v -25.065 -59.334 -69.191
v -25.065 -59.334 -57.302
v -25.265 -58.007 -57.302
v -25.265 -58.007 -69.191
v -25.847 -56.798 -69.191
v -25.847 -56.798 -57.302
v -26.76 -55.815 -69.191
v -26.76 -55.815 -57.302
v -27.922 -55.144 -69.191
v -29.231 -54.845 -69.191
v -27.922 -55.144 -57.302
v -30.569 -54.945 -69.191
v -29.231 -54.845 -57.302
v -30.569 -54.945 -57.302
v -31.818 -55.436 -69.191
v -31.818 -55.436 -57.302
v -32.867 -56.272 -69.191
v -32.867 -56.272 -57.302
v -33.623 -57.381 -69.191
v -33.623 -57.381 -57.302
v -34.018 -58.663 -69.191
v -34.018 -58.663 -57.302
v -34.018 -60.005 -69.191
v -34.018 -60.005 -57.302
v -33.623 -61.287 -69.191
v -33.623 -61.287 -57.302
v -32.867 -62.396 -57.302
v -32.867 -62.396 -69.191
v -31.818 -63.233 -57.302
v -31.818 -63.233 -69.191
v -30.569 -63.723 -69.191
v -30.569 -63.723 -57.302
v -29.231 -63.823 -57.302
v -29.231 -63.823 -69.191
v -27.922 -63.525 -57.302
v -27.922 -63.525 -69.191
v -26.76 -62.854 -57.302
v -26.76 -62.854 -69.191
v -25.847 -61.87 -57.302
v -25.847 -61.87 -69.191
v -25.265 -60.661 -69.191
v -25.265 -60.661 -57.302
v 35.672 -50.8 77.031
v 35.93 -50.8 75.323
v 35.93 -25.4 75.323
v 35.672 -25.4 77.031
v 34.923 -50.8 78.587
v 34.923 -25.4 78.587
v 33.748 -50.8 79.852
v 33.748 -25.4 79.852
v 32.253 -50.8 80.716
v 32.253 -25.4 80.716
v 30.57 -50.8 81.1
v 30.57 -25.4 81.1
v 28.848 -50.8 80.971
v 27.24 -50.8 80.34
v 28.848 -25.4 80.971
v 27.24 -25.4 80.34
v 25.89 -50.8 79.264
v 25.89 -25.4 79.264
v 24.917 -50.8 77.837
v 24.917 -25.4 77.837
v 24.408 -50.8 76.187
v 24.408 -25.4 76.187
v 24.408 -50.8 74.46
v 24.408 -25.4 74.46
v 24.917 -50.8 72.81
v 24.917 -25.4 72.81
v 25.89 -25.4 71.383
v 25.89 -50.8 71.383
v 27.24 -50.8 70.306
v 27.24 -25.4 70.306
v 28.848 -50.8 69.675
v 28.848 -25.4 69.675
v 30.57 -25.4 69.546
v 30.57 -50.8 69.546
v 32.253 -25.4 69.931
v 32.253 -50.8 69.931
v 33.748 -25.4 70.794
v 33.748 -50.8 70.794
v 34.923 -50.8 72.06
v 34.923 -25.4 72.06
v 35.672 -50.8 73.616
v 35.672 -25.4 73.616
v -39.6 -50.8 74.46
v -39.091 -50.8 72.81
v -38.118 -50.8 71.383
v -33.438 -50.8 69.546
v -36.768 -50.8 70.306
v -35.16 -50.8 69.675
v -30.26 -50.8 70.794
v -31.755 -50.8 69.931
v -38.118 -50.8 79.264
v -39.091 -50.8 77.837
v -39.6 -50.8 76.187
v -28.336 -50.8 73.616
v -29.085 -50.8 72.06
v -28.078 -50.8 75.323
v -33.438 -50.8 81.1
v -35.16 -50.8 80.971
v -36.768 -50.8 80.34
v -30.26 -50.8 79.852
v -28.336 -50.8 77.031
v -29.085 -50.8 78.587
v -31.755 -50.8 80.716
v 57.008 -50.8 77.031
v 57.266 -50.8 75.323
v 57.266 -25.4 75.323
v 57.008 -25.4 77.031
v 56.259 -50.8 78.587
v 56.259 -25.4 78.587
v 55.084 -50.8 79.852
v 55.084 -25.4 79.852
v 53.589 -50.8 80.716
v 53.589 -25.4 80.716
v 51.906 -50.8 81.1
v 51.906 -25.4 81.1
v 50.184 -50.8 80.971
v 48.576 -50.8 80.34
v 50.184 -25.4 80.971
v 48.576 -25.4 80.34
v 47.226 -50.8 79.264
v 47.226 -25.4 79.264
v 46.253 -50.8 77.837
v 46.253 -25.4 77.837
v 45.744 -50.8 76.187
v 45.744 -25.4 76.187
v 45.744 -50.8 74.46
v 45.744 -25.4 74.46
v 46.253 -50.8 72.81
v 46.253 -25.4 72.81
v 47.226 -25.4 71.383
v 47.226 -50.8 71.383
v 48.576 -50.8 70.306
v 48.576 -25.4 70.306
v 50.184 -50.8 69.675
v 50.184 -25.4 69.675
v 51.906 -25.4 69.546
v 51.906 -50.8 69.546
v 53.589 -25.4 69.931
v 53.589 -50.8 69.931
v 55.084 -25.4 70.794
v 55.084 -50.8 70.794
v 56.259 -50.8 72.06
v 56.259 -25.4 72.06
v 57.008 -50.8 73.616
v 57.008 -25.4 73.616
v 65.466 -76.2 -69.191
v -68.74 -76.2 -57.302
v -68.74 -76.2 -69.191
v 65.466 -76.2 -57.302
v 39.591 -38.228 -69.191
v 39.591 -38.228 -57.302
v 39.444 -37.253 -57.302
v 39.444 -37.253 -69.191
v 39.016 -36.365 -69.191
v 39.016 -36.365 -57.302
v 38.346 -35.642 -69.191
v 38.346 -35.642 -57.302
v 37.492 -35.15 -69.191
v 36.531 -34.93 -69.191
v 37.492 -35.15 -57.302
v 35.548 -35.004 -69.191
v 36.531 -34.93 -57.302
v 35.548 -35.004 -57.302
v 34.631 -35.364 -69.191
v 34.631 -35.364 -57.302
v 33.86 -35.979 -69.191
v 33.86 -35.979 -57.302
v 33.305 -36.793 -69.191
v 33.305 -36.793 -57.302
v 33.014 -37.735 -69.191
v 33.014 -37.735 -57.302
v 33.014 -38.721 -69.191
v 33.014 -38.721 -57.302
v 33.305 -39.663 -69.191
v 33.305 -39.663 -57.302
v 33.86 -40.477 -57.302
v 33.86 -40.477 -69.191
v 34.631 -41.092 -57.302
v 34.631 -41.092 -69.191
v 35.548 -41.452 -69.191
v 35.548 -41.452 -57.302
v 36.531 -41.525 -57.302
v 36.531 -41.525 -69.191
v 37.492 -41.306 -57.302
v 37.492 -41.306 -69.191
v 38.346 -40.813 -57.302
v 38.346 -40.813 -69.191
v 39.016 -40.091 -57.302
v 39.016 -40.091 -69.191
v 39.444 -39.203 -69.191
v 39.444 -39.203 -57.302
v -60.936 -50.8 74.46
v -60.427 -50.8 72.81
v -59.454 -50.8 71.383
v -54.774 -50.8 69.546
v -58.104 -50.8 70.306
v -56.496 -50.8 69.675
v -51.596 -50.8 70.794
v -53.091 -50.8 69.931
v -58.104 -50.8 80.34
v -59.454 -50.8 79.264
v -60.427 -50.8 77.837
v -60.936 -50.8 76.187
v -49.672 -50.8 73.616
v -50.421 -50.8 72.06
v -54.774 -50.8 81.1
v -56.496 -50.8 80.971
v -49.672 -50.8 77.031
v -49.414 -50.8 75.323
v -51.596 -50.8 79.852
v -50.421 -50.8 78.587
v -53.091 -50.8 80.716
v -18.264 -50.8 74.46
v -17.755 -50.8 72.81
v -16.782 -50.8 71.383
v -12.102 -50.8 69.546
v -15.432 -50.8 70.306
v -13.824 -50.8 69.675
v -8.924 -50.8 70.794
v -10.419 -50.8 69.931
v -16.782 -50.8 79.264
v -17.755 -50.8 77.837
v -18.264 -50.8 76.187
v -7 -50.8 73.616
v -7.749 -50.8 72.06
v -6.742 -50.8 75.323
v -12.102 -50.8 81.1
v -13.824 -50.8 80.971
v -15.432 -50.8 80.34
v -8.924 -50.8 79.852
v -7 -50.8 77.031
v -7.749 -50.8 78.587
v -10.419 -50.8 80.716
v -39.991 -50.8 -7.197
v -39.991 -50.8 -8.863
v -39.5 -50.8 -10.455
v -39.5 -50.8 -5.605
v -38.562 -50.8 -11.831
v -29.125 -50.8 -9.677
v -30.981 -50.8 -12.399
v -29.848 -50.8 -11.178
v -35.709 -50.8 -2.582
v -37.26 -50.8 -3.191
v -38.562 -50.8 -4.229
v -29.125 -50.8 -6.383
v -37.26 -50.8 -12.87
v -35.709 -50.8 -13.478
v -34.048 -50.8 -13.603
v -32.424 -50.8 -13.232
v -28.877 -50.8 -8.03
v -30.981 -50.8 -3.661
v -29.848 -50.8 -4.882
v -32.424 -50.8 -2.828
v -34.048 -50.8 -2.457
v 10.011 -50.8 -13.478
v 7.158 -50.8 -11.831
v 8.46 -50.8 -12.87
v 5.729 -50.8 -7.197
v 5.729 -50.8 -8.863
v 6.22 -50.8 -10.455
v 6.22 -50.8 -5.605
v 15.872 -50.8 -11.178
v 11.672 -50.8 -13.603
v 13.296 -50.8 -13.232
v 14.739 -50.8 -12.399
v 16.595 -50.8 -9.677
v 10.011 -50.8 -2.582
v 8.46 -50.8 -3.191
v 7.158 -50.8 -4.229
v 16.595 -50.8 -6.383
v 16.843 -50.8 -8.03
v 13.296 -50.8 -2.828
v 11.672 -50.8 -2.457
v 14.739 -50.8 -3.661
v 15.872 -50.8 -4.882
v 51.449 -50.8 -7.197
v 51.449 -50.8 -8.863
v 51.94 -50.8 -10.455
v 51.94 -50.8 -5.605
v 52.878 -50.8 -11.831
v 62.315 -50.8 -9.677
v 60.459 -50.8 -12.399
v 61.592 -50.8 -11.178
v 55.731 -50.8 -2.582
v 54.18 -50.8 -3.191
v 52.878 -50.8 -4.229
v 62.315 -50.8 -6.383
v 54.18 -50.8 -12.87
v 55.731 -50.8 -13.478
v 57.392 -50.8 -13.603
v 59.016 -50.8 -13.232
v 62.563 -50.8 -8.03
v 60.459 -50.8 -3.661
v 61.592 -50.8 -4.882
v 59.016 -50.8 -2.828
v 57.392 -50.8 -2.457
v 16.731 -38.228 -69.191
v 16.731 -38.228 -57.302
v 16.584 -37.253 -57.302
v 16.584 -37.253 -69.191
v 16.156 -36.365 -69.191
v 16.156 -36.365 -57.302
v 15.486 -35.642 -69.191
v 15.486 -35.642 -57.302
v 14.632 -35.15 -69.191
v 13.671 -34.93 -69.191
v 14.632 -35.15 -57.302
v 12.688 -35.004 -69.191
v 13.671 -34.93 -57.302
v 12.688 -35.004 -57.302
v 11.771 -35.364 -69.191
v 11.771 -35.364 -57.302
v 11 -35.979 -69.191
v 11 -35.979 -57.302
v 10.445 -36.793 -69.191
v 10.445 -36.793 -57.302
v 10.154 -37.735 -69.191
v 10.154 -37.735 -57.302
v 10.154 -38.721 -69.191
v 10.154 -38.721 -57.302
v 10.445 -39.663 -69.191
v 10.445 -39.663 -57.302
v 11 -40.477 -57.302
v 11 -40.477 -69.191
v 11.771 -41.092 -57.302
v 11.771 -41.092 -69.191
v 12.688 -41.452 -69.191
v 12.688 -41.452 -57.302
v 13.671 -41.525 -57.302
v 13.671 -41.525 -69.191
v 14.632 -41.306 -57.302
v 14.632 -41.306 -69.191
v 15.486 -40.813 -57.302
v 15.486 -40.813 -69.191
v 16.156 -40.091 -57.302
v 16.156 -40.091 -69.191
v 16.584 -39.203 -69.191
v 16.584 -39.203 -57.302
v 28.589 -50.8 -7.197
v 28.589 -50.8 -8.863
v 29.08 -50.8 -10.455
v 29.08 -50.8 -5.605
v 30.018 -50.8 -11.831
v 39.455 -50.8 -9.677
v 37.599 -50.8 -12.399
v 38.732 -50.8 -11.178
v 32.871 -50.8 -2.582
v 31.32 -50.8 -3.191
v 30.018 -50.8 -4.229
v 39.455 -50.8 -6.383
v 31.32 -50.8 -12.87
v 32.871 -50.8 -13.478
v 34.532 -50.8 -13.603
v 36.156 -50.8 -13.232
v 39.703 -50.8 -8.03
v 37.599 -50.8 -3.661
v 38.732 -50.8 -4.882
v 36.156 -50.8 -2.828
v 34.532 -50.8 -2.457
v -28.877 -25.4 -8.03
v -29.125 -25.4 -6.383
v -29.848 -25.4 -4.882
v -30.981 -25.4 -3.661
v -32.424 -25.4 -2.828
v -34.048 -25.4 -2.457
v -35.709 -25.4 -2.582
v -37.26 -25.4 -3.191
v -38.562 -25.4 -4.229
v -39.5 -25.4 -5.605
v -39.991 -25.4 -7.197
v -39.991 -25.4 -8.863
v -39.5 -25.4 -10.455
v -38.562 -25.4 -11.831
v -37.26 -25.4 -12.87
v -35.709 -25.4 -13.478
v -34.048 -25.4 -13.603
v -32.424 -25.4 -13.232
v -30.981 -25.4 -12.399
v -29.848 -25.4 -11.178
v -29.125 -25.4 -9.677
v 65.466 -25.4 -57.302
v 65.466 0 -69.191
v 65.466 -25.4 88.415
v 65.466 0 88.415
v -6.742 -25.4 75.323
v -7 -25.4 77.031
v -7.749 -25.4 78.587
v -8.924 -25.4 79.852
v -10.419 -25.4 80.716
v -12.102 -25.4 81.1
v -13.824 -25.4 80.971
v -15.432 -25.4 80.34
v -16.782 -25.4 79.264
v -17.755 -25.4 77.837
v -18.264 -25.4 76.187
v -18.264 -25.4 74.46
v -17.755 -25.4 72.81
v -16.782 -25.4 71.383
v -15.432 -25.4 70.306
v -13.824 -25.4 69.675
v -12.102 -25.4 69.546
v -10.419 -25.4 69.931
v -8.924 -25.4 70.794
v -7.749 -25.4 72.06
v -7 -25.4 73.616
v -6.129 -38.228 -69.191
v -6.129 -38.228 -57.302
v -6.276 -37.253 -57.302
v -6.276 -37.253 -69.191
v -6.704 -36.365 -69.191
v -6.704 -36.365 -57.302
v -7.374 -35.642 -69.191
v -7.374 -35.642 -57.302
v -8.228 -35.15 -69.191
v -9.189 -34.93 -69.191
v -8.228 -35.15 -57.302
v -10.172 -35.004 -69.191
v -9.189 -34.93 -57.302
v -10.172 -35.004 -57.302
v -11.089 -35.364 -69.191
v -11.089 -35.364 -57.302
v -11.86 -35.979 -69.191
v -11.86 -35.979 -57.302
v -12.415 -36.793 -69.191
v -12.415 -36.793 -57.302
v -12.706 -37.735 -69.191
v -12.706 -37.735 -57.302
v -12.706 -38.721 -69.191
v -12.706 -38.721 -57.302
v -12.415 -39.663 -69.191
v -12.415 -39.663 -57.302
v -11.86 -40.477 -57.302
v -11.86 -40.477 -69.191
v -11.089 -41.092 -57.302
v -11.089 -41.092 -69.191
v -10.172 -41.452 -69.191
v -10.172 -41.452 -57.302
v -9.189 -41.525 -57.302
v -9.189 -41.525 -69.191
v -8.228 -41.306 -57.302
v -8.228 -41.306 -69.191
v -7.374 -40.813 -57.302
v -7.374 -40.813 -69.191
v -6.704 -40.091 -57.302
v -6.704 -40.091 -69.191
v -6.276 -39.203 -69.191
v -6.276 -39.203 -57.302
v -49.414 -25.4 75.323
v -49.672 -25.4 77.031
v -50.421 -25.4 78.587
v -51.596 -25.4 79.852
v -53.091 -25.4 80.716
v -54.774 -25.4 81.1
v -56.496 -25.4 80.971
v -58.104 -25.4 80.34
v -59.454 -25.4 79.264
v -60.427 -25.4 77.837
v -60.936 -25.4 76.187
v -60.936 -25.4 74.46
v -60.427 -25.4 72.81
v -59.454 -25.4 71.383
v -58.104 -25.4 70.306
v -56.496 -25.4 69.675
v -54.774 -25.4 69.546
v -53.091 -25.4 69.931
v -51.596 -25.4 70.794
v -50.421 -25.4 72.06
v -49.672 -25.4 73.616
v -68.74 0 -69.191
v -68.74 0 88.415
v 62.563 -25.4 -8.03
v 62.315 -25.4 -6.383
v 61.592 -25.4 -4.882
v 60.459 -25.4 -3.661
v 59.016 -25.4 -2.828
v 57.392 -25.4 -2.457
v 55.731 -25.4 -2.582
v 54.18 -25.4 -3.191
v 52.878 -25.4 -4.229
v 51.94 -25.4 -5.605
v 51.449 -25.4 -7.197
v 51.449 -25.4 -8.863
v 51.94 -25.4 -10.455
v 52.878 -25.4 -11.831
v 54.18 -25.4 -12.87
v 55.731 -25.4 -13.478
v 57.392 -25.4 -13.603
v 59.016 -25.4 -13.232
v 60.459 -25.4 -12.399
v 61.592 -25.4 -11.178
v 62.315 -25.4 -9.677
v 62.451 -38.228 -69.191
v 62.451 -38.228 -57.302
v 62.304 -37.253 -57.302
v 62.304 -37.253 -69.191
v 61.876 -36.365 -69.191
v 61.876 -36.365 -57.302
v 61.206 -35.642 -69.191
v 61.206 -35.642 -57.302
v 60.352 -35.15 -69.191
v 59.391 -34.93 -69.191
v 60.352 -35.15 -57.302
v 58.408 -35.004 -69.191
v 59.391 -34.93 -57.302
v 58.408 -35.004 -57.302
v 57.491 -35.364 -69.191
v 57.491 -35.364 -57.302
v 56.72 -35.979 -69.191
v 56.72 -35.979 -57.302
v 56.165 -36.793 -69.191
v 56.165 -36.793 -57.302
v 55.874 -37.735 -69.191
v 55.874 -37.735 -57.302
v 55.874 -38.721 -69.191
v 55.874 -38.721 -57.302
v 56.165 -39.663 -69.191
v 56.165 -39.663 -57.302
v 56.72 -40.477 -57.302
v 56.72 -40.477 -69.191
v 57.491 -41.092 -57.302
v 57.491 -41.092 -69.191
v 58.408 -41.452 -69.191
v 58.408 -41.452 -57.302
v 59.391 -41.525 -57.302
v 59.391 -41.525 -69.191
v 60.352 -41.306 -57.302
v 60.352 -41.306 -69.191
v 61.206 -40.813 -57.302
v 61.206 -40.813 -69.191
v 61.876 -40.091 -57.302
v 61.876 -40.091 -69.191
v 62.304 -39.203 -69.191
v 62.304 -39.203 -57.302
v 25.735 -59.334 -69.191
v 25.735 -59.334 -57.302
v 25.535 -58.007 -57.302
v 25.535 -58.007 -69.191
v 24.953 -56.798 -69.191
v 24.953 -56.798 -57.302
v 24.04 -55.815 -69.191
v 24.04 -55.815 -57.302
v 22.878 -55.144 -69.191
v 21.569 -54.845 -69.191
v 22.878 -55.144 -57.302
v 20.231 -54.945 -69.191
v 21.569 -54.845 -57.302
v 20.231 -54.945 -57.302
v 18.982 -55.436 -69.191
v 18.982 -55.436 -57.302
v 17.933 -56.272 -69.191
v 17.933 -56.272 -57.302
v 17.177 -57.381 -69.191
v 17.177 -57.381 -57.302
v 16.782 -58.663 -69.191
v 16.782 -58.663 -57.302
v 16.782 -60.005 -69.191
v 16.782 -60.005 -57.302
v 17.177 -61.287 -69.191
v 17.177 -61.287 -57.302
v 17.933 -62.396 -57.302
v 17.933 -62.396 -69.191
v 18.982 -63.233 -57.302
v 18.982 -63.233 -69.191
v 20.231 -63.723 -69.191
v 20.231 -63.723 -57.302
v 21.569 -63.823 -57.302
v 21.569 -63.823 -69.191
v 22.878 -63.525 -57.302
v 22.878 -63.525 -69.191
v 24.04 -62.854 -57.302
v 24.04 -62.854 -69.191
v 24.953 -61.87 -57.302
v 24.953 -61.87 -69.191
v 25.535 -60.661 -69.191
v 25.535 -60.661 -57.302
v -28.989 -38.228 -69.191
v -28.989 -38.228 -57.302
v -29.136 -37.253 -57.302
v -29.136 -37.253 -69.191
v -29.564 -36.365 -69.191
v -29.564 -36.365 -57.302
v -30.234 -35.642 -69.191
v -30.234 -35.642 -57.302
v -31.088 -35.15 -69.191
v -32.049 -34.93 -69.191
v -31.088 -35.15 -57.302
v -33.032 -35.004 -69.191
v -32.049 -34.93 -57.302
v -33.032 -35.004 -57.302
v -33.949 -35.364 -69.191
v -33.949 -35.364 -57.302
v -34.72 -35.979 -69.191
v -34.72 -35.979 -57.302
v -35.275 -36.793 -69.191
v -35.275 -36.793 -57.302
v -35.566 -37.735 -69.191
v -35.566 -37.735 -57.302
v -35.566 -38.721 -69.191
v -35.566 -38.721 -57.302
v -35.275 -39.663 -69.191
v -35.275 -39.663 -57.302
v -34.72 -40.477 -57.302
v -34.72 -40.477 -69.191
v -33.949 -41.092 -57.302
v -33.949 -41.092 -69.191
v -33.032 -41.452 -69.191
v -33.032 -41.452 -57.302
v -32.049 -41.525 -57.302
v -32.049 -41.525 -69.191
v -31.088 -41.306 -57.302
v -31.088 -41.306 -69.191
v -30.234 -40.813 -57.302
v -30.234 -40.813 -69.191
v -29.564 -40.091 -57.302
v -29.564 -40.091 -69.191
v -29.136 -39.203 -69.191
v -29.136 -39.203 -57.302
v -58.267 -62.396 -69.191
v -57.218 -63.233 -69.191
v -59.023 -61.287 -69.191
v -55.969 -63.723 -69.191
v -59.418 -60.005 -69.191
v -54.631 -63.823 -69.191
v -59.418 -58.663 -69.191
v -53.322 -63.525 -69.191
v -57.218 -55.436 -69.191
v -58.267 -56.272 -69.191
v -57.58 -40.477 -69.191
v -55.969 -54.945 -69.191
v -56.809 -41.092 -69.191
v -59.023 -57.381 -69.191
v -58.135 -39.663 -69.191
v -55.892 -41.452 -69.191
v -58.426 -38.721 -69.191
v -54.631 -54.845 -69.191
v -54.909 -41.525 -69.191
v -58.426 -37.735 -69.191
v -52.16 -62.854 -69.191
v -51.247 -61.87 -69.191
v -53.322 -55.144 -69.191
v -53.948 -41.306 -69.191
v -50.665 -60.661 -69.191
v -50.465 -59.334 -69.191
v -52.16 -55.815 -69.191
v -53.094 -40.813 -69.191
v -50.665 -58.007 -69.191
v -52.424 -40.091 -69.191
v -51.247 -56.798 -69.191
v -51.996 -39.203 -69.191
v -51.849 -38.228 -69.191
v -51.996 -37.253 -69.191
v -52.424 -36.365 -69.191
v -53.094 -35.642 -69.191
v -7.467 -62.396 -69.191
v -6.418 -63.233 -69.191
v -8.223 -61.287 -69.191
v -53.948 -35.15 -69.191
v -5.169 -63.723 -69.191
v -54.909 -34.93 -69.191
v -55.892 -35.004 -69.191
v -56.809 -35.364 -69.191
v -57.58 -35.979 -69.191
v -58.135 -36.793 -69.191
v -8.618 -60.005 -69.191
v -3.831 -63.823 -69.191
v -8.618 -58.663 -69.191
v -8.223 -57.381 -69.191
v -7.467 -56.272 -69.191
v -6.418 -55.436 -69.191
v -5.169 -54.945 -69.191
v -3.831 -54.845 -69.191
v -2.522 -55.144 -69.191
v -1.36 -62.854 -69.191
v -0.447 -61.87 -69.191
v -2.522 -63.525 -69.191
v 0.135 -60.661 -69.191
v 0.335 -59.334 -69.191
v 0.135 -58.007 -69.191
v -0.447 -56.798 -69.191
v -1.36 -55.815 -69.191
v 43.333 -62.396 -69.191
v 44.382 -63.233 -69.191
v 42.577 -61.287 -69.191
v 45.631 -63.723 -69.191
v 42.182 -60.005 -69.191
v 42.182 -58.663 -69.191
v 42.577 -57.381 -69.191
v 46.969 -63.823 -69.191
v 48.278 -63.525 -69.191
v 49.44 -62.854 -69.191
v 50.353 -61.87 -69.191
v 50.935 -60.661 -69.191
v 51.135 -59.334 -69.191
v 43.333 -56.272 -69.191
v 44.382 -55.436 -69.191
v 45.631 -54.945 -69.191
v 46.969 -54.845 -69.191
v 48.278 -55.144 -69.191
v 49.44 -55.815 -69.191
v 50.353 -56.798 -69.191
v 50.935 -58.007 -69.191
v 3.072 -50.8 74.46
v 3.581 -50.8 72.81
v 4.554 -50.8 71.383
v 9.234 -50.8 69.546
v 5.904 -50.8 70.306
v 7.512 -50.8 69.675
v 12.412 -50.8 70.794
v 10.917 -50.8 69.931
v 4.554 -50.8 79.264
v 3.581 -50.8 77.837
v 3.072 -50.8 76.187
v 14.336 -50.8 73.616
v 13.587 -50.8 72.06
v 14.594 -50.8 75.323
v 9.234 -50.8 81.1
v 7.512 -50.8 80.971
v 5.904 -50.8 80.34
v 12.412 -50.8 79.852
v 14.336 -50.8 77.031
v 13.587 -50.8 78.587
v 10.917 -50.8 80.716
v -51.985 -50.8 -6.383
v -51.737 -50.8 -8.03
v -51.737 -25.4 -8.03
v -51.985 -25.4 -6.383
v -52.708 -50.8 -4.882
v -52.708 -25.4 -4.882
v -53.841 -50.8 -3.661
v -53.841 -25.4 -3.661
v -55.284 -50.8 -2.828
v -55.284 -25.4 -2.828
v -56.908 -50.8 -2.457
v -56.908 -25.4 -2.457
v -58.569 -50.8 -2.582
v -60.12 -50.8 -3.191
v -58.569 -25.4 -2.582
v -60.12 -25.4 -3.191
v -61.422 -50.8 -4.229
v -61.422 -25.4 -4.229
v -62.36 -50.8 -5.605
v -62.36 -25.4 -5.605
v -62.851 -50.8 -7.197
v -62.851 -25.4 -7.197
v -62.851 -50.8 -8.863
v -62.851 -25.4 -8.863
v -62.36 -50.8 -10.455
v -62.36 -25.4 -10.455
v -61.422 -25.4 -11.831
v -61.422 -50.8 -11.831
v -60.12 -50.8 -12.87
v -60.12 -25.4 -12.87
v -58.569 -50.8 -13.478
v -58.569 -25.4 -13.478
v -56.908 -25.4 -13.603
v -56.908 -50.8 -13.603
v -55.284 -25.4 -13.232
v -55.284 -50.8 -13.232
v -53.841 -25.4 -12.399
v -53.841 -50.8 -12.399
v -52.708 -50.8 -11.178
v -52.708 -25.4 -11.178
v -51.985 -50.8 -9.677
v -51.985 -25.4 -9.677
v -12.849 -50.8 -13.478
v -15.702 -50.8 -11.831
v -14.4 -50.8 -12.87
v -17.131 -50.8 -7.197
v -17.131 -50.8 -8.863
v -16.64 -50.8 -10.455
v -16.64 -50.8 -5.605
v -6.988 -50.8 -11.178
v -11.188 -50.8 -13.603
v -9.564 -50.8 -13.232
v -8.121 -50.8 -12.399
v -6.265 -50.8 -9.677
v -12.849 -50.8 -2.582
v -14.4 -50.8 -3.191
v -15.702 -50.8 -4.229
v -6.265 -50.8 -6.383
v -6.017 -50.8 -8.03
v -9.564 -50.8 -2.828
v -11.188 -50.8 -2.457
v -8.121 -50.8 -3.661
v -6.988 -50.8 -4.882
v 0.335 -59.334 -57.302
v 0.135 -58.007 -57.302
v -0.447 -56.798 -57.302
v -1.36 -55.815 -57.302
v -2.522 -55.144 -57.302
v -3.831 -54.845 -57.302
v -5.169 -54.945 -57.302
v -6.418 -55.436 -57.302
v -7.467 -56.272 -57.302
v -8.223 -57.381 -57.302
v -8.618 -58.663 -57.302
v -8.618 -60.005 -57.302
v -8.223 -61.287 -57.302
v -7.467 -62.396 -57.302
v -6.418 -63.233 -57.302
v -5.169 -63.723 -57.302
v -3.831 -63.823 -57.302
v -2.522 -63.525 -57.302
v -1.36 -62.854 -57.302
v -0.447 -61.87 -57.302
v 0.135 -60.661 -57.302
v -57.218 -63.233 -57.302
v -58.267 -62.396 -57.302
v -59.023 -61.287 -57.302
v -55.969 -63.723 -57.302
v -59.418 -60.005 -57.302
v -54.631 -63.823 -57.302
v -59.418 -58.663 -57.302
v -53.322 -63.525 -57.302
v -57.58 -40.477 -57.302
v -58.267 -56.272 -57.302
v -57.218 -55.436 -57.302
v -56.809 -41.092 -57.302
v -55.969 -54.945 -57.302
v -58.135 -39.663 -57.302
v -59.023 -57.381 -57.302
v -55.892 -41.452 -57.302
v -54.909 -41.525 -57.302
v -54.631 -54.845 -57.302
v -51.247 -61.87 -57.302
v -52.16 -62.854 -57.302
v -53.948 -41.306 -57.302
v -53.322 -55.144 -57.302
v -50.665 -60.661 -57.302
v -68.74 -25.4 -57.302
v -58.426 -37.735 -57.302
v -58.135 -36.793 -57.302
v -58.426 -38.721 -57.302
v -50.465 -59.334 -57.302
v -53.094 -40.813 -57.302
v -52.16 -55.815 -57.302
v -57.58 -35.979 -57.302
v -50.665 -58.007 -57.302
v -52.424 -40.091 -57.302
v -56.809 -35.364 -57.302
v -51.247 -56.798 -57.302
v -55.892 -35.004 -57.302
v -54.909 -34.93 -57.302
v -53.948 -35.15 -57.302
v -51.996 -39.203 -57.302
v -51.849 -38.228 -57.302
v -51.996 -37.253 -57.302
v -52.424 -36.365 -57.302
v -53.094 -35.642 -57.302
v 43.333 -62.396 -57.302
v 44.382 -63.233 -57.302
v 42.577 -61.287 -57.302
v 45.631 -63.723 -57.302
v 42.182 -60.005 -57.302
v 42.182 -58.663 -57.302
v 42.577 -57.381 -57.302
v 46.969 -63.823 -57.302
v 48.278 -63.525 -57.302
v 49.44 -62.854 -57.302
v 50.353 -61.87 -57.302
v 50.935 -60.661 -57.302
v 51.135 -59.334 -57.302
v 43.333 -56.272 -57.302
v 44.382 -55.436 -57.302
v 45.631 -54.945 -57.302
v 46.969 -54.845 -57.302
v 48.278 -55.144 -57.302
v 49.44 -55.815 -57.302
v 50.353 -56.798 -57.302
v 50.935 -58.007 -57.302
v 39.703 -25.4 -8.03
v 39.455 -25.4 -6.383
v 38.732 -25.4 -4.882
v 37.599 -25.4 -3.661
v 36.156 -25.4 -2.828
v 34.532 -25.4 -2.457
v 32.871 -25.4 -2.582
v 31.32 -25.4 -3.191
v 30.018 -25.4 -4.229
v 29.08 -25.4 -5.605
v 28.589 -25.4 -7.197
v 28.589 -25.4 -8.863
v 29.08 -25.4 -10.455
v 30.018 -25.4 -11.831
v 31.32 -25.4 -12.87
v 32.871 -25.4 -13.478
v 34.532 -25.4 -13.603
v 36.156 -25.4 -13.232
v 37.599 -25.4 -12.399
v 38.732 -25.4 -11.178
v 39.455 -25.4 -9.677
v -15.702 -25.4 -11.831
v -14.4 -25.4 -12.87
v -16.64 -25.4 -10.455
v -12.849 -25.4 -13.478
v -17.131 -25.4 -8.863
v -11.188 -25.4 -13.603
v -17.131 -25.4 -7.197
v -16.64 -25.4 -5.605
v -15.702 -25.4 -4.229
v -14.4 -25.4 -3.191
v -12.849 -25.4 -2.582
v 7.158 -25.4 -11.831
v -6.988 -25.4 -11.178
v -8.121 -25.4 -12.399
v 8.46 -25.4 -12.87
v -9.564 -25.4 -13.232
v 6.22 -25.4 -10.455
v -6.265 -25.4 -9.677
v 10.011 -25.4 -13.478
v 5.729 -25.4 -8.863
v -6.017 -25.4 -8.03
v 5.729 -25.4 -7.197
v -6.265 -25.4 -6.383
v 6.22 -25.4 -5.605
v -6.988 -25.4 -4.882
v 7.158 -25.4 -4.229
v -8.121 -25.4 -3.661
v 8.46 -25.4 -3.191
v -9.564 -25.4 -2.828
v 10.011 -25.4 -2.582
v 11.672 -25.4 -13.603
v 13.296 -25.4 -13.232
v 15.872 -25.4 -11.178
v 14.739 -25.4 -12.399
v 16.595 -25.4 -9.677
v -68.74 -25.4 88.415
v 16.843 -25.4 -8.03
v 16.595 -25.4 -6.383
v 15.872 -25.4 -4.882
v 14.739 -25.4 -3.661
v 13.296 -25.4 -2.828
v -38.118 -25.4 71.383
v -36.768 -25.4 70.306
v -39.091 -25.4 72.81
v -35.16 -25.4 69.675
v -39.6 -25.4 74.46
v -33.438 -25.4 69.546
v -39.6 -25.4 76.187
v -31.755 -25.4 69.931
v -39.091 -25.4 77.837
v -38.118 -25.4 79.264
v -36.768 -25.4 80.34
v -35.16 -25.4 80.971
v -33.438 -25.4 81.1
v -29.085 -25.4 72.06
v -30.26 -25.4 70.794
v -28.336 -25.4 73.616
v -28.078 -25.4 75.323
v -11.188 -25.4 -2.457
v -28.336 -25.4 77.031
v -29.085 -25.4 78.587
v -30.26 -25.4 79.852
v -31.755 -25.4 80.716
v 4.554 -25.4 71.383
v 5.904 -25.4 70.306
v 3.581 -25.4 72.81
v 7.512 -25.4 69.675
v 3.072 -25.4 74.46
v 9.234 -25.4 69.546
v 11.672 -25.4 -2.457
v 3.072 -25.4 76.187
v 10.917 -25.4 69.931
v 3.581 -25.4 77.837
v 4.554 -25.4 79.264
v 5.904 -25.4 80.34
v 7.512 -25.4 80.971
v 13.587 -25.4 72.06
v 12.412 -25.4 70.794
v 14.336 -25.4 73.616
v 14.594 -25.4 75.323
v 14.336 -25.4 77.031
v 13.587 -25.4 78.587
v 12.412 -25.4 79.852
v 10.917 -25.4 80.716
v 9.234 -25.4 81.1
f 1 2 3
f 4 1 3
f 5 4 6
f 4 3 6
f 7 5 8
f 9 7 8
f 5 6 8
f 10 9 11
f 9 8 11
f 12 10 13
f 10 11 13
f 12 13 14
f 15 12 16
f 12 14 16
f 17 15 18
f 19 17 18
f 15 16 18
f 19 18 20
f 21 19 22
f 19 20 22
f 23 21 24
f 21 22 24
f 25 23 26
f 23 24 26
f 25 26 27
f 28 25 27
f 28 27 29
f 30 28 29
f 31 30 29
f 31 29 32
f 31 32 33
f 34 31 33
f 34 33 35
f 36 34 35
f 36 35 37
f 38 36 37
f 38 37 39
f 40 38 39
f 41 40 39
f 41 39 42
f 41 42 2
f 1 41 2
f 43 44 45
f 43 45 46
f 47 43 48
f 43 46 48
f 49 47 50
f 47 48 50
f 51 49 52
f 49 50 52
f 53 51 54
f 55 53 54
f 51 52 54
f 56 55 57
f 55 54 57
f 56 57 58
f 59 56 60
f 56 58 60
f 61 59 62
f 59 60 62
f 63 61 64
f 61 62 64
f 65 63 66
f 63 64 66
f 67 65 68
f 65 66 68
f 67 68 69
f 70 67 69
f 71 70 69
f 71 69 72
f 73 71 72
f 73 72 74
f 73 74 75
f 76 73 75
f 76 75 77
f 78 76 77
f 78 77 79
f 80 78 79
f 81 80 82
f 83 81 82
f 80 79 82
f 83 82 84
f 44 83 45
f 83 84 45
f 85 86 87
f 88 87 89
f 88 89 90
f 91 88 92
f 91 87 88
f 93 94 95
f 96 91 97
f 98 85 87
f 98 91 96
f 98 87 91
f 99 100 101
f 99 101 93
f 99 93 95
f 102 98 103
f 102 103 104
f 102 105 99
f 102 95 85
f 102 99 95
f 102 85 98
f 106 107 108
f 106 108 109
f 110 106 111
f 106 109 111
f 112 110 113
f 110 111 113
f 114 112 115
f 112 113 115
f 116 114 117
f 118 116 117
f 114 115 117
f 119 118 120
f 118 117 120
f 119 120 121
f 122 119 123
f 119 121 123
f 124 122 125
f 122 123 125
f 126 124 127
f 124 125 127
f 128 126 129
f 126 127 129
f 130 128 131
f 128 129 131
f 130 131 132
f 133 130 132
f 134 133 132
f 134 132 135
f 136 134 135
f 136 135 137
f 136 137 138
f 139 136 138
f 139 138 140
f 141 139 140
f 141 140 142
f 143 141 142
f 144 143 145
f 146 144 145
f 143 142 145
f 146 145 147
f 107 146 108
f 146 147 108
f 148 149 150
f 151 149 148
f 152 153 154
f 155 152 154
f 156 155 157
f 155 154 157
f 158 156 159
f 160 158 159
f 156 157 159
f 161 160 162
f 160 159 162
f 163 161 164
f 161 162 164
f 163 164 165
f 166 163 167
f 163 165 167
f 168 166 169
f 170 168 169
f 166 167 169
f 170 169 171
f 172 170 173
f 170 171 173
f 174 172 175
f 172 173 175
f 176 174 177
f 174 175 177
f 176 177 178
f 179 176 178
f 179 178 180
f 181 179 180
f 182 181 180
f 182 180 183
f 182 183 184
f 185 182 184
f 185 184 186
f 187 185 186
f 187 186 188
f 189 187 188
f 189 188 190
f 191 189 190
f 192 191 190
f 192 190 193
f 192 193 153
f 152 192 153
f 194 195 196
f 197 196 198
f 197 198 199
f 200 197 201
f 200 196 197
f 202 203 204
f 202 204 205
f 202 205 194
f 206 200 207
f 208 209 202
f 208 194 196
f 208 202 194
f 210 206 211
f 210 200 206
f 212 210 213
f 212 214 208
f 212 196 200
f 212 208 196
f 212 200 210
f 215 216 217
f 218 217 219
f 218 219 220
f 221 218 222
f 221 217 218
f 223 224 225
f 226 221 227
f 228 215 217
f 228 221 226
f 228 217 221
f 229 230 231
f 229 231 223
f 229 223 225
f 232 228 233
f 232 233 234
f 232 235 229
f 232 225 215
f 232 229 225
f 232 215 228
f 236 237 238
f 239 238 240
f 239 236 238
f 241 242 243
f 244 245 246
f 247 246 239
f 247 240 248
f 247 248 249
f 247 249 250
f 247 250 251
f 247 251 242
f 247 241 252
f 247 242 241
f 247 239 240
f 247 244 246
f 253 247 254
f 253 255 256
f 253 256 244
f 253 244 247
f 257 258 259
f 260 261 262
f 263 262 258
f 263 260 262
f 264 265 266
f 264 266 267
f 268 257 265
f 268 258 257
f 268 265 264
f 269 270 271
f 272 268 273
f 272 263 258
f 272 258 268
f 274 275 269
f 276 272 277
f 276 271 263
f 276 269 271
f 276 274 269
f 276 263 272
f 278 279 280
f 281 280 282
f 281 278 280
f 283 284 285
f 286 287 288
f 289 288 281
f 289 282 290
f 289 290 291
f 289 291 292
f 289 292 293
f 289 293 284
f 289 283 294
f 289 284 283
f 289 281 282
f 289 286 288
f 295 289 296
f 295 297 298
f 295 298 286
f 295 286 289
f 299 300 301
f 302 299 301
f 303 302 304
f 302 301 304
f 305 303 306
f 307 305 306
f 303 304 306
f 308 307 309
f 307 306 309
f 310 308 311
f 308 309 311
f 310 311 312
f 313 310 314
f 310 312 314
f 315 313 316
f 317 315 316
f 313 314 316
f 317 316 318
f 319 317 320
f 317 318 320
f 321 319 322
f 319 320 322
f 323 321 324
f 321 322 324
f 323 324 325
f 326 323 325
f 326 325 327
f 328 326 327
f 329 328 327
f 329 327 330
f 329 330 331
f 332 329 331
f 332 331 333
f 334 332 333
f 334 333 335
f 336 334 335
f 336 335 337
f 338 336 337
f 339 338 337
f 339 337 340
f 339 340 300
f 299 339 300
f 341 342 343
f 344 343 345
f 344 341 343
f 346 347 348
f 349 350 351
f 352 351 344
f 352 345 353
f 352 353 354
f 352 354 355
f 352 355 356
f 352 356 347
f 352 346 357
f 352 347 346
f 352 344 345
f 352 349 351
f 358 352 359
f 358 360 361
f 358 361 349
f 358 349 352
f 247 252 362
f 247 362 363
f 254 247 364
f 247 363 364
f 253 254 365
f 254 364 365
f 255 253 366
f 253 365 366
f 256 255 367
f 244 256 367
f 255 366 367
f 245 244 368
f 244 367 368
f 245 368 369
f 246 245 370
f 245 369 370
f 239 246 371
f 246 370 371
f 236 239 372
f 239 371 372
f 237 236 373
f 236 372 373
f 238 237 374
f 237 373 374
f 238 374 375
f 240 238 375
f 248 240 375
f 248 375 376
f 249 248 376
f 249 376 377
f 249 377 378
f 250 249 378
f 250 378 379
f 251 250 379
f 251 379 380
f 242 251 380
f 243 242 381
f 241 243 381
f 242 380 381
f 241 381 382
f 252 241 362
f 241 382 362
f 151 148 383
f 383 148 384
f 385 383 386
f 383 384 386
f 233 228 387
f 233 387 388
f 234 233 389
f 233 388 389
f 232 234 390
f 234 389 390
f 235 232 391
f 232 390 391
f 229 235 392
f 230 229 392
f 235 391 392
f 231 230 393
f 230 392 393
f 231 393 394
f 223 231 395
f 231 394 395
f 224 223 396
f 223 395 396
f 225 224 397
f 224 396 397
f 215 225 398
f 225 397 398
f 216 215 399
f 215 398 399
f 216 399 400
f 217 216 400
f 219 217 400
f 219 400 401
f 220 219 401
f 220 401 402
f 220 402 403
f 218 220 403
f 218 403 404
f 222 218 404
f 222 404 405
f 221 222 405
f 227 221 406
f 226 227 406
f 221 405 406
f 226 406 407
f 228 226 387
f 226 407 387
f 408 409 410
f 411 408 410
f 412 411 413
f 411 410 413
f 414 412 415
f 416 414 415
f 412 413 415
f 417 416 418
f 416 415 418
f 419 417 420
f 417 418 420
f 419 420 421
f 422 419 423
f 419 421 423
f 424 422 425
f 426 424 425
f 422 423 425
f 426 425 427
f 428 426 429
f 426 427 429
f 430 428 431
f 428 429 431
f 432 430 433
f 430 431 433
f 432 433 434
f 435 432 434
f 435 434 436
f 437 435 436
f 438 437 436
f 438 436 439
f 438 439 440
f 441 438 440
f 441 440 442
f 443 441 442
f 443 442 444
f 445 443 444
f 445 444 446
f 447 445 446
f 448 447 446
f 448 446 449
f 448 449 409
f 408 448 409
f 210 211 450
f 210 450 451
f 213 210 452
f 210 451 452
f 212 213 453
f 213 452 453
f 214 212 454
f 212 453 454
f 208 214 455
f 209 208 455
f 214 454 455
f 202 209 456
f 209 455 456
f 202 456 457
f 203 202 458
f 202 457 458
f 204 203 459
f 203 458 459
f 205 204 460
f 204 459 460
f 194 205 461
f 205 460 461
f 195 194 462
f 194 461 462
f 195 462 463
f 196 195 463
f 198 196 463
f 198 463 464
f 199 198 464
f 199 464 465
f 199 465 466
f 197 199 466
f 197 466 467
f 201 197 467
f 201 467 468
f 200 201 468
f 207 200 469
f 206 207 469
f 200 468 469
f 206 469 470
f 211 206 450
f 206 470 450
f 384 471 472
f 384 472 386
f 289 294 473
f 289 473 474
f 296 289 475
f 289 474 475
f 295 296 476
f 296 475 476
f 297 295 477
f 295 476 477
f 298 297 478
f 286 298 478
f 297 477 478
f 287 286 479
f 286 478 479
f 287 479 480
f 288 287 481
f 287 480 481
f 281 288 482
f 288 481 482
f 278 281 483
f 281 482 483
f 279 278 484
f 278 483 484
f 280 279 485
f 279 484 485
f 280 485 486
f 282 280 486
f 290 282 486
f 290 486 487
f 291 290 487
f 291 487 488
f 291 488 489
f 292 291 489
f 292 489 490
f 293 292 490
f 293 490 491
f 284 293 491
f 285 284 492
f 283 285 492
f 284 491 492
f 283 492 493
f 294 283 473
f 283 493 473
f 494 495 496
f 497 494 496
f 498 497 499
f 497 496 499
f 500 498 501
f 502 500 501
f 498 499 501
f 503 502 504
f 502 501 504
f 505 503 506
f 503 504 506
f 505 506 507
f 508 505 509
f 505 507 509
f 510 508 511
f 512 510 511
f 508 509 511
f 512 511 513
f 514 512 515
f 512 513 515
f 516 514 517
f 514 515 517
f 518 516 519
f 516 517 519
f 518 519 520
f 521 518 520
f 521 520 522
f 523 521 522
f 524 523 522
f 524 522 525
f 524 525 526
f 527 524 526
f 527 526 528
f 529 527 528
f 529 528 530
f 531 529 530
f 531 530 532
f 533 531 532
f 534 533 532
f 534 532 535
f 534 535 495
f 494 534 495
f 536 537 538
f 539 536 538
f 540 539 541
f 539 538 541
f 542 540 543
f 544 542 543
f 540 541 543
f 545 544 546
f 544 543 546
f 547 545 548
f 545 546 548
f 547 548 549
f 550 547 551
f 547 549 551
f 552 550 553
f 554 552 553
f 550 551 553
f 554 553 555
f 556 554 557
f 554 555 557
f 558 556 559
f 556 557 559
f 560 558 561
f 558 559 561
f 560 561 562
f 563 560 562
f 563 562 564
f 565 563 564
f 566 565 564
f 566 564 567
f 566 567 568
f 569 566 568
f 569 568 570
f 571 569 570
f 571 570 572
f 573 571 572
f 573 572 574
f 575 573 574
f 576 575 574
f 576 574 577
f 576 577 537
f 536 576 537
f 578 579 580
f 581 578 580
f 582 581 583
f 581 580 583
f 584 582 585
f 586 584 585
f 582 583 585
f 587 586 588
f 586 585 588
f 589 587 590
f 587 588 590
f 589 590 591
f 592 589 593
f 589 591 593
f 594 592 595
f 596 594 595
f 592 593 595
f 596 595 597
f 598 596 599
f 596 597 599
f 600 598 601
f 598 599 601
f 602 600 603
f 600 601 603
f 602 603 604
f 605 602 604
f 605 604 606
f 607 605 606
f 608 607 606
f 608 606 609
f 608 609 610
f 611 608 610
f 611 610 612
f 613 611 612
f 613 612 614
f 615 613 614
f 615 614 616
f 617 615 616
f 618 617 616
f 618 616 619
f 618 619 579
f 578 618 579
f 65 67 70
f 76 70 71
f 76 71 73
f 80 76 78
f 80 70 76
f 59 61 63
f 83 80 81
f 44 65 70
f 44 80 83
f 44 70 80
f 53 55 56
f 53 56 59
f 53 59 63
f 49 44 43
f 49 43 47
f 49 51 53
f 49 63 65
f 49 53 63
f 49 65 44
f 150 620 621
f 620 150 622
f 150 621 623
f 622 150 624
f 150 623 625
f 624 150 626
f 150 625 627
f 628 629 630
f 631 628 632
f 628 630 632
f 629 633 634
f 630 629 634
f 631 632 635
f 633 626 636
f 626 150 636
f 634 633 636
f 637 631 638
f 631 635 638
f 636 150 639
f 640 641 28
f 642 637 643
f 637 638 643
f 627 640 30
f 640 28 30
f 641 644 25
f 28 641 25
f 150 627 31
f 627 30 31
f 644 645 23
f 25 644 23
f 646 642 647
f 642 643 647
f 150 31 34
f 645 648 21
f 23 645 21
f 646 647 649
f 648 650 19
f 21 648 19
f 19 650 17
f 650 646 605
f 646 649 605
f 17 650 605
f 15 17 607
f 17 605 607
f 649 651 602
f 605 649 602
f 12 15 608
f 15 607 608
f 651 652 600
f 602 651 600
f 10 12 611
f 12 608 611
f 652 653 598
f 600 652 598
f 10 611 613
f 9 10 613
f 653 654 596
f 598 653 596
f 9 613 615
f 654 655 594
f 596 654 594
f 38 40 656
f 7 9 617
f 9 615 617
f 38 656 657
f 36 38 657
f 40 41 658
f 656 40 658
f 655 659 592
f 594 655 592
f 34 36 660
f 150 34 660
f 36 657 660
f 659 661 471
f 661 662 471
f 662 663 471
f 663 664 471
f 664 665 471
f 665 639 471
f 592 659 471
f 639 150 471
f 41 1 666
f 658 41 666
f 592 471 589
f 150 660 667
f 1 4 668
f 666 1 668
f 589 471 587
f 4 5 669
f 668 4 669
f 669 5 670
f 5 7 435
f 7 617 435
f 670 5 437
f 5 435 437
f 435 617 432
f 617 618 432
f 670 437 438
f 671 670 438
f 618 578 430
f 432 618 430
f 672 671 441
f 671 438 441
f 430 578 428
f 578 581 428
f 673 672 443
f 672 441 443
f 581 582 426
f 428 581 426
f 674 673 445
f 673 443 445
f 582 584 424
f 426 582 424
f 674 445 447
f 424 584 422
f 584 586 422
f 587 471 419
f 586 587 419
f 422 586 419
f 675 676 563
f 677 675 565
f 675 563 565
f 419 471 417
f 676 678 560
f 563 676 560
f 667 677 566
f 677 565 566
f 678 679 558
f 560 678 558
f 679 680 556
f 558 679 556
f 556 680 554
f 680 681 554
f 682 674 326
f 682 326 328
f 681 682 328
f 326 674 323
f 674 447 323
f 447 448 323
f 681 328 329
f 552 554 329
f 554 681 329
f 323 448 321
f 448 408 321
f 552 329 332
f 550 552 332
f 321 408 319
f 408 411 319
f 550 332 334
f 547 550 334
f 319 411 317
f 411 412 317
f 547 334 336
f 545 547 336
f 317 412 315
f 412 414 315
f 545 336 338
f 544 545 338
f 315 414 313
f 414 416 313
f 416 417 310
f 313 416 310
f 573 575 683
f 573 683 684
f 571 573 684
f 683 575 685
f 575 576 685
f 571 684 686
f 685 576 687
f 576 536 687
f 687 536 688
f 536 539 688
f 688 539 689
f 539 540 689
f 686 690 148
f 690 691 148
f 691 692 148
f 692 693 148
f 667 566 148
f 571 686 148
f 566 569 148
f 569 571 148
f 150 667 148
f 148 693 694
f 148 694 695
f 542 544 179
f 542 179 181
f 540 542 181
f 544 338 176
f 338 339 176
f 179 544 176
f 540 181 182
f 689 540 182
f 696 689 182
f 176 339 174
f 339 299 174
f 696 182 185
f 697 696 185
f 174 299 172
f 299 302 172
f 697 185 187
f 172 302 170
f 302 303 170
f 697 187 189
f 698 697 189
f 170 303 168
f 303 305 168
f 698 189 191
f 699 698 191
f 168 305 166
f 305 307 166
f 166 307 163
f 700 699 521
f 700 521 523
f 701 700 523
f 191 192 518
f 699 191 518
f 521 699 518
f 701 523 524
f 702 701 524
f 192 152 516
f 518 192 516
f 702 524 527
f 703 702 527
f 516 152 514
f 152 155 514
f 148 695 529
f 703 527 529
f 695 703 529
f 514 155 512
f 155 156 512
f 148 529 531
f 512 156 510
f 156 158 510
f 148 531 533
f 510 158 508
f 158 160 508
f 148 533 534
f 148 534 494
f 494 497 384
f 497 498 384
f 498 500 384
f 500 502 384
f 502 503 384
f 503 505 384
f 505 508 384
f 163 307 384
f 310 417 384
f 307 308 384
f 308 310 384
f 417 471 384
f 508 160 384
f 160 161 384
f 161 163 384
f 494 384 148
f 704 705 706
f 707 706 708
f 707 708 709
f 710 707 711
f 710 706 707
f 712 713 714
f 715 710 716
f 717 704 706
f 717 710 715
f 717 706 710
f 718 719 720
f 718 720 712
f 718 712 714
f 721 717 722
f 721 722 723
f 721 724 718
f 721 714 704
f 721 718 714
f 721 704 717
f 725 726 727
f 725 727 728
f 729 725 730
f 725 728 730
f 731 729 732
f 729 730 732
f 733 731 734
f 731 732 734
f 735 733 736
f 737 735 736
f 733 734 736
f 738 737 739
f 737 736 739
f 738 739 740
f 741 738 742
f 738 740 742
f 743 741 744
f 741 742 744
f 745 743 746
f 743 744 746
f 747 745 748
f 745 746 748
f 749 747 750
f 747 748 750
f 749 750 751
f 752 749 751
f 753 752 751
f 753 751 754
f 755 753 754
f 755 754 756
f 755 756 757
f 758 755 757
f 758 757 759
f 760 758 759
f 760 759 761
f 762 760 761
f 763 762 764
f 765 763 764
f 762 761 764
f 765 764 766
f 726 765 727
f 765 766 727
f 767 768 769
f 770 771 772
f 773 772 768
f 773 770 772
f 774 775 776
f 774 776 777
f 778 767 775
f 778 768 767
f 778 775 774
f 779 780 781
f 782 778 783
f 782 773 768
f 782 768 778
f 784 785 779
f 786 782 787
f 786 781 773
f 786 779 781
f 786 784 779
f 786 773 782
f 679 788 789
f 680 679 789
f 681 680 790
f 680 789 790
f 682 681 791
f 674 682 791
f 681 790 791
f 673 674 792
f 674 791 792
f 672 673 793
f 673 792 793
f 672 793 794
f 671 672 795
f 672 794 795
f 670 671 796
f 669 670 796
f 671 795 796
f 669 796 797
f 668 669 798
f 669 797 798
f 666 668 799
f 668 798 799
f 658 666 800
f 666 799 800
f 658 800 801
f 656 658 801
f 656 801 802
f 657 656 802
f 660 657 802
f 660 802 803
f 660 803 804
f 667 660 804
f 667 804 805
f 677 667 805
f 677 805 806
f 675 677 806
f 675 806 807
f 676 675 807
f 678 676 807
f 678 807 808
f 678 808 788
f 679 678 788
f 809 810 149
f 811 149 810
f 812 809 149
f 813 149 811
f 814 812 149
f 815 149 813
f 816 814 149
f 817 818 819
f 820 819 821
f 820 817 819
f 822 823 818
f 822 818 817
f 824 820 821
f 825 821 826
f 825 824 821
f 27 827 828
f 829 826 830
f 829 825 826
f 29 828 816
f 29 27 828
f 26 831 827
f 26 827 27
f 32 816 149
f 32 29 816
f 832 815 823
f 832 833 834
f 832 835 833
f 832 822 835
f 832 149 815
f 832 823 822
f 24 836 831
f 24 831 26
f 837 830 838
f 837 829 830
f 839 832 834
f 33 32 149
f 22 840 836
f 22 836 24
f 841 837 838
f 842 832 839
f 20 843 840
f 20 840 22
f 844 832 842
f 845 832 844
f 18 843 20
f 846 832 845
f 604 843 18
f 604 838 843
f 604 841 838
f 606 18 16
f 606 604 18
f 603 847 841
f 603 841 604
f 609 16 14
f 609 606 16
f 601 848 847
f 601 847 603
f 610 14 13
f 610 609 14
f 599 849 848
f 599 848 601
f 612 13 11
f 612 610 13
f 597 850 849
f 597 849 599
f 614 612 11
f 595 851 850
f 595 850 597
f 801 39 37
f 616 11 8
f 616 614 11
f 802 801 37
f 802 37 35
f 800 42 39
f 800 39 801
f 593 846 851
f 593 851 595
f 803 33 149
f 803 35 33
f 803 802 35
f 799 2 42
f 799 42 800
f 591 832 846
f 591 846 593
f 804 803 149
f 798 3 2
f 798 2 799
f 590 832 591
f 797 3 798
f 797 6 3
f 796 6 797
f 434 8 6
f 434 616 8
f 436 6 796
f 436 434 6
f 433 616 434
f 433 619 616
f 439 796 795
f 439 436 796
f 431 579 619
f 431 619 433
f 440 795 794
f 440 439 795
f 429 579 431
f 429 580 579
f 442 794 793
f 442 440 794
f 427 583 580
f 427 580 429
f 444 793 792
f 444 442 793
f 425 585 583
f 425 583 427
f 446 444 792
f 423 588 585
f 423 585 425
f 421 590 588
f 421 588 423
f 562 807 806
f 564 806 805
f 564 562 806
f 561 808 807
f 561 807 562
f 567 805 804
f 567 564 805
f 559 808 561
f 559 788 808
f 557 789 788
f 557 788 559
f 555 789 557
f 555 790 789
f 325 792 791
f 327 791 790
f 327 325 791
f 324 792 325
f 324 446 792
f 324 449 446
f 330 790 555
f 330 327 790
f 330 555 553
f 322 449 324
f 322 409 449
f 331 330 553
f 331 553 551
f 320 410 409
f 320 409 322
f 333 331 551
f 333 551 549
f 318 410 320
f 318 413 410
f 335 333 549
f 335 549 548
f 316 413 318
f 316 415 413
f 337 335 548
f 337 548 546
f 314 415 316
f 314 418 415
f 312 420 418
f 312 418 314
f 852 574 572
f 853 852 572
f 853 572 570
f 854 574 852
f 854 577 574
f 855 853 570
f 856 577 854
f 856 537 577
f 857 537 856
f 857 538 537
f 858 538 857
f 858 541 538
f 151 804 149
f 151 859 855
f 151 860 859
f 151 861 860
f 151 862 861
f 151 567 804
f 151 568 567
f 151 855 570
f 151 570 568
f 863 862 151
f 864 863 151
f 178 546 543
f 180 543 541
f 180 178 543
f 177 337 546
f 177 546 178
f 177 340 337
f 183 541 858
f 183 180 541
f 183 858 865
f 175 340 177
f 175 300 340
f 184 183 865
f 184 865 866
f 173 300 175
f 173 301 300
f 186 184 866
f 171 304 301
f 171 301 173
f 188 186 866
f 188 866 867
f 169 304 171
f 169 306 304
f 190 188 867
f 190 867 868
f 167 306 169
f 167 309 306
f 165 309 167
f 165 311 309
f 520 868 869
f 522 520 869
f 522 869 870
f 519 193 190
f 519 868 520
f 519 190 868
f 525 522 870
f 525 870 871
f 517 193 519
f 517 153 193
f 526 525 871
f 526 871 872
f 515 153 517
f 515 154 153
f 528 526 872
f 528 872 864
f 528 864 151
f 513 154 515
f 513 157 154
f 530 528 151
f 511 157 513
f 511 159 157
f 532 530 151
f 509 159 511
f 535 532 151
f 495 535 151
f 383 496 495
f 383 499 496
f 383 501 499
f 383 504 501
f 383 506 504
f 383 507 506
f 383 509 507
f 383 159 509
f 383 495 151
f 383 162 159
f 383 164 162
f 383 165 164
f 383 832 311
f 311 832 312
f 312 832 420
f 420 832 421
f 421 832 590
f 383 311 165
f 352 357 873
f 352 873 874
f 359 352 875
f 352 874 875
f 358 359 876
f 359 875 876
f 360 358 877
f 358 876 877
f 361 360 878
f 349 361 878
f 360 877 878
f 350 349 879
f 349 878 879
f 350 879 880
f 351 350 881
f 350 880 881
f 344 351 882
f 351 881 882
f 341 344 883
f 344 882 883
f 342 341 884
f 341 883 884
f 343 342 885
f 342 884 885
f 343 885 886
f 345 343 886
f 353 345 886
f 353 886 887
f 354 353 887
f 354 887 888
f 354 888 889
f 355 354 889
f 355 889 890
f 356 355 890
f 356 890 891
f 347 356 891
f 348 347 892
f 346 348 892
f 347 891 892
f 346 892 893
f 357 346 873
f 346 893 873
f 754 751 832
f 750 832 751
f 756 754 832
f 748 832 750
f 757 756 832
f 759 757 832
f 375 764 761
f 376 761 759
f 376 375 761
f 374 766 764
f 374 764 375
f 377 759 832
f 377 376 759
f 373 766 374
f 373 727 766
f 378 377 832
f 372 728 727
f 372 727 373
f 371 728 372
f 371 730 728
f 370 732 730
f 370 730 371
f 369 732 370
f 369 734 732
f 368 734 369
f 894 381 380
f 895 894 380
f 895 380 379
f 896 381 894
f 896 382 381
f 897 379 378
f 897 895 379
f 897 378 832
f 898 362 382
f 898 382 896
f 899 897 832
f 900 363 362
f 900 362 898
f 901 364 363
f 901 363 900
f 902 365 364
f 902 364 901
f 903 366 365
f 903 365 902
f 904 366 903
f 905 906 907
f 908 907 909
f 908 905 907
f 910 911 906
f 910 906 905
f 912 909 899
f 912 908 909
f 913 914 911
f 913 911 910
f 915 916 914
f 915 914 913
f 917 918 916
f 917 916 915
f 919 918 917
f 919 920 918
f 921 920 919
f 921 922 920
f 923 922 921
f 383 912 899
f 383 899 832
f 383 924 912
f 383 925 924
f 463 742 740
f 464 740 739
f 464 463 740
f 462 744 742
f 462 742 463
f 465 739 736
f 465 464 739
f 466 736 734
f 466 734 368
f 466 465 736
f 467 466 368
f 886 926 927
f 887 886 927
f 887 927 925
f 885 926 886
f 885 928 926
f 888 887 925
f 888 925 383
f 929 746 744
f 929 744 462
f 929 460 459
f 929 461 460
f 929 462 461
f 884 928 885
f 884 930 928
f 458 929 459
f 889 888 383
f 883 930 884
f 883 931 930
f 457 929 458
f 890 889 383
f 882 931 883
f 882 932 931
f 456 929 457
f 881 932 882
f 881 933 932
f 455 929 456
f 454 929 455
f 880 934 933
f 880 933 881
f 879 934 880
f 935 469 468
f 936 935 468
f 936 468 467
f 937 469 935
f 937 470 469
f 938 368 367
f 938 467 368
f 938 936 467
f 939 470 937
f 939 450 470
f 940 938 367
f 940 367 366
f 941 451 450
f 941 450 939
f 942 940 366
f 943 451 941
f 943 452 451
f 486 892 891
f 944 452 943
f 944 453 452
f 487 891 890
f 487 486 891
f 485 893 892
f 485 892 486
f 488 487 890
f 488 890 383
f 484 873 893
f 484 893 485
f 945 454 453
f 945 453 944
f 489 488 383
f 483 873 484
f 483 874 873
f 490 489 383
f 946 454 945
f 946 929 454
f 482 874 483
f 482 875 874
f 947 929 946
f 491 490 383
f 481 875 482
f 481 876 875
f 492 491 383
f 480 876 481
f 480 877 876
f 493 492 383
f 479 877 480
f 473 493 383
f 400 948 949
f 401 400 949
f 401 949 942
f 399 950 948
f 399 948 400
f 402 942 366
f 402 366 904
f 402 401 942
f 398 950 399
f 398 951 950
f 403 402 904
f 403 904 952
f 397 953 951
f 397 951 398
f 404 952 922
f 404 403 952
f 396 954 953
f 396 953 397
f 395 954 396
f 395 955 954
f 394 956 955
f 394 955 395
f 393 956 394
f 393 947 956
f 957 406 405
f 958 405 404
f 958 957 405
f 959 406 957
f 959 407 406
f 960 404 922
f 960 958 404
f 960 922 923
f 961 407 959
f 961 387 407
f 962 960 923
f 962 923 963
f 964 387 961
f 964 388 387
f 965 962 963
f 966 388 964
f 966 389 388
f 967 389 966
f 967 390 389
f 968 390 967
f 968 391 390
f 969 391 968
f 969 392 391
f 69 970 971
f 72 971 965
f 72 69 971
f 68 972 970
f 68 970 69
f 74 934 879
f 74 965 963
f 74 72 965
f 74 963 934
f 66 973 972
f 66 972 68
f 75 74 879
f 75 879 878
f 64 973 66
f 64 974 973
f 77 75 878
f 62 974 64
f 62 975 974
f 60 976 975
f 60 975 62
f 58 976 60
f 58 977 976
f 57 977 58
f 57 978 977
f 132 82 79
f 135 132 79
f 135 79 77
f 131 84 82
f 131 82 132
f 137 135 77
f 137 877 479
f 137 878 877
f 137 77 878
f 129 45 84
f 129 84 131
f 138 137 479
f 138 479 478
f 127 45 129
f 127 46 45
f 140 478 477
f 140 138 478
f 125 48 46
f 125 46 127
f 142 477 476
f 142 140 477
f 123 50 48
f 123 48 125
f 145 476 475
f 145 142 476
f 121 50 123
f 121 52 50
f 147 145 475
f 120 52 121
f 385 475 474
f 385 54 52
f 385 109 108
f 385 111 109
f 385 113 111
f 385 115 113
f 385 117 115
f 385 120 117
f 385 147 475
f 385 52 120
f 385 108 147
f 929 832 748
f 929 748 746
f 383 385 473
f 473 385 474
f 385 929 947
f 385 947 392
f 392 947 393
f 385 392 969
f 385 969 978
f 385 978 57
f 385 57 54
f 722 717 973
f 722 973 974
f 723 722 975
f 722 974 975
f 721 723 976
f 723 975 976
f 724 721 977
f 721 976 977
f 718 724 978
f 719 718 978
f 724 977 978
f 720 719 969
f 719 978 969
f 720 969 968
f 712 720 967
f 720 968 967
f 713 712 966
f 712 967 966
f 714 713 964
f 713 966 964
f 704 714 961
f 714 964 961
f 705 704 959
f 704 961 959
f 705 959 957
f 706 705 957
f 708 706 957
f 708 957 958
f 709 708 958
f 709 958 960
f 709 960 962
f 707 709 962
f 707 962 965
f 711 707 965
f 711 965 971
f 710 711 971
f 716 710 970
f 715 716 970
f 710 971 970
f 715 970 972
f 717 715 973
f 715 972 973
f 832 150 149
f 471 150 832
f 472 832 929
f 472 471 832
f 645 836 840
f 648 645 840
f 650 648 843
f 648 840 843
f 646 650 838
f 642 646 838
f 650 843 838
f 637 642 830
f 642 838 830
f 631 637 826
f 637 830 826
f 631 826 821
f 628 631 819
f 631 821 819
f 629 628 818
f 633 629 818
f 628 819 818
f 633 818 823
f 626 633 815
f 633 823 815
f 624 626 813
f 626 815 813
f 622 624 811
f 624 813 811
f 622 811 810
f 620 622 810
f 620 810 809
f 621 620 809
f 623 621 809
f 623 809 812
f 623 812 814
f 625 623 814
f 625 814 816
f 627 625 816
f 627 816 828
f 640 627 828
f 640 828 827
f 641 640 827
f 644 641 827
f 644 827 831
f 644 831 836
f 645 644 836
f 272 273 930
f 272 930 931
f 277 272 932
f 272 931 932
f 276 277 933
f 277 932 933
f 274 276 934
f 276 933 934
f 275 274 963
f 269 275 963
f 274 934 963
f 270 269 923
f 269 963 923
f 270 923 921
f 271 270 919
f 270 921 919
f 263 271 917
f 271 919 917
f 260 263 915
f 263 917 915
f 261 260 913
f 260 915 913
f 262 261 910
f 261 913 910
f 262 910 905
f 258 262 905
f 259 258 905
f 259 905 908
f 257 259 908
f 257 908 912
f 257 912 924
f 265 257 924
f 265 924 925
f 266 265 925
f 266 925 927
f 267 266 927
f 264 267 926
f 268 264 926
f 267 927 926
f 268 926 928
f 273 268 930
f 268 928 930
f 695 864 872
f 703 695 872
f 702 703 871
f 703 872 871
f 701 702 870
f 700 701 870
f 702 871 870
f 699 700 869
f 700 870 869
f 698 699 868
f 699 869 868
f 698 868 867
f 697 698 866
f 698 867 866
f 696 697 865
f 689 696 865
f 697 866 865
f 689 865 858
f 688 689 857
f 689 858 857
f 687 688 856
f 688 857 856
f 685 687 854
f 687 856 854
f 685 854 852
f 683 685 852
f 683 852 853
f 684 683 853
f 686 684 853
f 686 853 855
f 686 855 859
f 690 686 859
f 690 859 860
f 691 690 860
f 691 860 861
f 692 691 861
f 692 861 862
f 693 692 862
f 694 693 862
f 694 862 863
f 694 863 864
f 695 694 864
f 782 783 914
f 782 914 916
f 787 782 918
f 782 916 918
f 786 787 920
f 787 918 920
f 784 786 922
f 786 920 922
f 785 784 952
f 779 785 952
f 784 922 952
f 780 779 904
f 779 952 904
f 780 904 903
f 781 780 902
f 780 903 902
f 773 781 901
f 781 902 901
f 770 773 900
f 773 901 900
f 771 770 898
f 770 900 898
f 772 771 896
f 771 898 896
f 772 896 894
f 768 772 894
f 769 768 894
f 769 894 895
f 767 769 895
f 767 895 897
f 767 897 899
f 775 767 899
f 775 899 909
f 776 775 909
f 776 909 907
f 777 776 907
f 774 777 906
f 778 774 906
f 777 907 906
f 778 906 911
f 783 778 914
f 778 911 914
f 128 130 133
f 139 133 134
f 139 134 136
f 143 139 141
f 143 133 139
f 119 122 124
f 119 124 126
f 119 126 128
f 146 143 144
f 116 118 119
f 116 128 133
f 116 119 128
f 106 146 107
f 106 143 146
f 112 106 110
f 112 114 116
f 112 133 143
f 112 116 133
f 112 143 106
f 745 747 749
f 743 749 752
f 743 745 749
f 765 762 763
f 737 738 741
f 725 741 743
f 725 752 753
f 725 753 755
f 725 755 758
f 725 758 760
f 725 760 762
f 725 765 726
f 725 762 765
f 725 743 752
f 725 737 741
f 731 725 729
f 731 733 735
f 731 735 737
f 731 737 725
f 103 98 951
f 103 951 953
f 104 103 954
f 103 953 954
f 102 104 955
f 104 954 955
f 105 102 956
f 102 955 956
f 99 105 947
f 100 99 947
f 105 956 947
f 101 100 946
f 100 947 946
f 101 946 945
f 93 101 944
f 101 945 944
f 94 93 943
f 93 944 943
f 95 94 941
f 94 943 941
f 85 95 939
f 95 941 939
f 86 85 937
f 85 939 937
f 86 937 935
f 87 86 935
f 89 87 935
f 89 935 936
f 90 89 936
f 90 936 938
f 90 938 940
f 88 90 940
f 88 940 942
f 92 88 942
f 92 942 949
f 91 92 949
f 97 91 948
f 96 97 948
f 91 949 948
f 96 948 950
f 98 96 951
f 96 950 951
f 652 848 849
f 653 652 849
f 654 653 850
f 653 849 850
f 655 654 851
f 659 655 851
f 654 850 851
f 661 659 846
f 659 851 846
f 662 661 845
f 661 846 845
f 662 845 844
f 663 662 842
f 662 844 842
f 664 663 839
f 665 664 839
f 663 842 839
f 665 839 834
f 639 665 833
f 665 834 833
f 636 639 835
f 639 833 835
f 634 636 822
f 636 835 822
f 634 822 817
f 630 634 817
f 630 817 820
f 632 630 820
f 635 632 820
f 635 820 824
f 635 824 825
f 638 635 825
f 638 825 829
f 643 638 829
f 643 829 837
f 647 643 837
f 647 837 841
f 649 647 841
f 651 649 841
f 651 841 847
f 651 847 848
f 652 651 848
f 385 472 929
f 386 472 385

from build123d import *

# Parameters (mm, degrees)
F0_W     = 134.2057809234
F0_H     = 157.6057672501
F1_DEPTH = 25.4
F2_W     = 134.2057809234
F2_H     = 11.8888095021
F3_DEPTH = 50.8
F4_R     = 3.3067851736
F4_R_2   = 4.5017573087
F5_DEPTH = 25.4
F6_R     = 5.7930300282
F6_R_2   = 5.5883167401
F7_DEPTH = 25.4


with BuildPart() as f1:
    # F0 (on Front) → F1 (new body)
    with BuildSketch(Plane.XZ):
        with Locations((-1.6366653144, 9.6122771502)):
            Rectangle(F0_W, F0_H)
    extrude(amount=F1_DEPTH)

    # F2 (on face) → F3 (join)
    with BuildSketch(Plane.XZ.offset(25.4)):
        with Locations((-1.6366653144, -63.2462017238)):
            Rectangle(F2_W, F2_H)
    extrude(amount=F3_DEPTH)

    # F4 (on face) → F5 (cut)
    with BuildSketch(Plane.XY.offset(-57.3017969728)):
        with Locations((-55.1559180021, -38.2278487086)):
            Circle(F4_R)
        with Locations((-32.2959180021, -38.2278487086)):
            Circle(F4_R)
        with Locations((-9.4359180021, -38.2278487086)):
            Circle(F4_R)
        with Locations((13.4240819979, -38.2278487086)):
            Circle(F4_R)
        with Locations((36.2840819979, -38.2278487086)):
            Circle(F4_R)
        with Locations((59.1440819979, -38.2278487086)):
            Circle(F4_R)
        with Locations((-54.9669824541, -59.3341551721)):
            Circle(F4_R_2)
        with Locations((-29.5669824541, -59.3341551721)):
            Circle(F4_R_2)
        with Locations((-4.1669824541, -59.3341551721)):
            Circle(F4_R_2)
        with Locations((21.2330175459, -59.3341551721)):
            Circle(F4_R_2)
        with Locations((46.6330175459, -59.3341551721)):
            Circle(F4_R_2)
    extrude(amount=-F5_DEPTH, mode=Mode.SUBTRACT)

    # F6 (on face) → F7 (join)
    with BuildSketch(Plane.XZ.offset(25.4)):
        with Locations((-55.2074015141, 75.3232464194)):
            Circle(F6_R)
        with Locations((-33.8714015141, 75.3232464194)):
            Circle(F6_R)
        with Locations((-12.5354015141, 75.3232464194)):
            Circle(F6_R)
        with Locations((8.8005984859, 75.3232464194)):
            Circle(F6_R)
        with Locations((30.1365984859, 75.3232464194)):
            Circle(F6_R)
        with Locations((51.4725984859, 75.3232464194)):
            Circle(F6_R)
        with Locations((-57.3255419731, -8.0301519483)):
            Circle(F6_R_2)
        with Locations((-34.4655419731, -8.0301519483)):
            Circle(F6_R_2)
        with Locations((-11.6055419731, -8.0301519483)):
            Circle(F6_R_2)
        with Locations((11.2544580269, -8.0301519483)):
            Circle(F6_R_2)
        with Locations((34.1144580269, -8.0301519483)):
            Circle(F6_R_2)
        with Locations((56.9744580269, -8.0301519483)):
            Circle(F6_R_2)
    extrude(amount=F7_DEPTH)


solid = f1.part
